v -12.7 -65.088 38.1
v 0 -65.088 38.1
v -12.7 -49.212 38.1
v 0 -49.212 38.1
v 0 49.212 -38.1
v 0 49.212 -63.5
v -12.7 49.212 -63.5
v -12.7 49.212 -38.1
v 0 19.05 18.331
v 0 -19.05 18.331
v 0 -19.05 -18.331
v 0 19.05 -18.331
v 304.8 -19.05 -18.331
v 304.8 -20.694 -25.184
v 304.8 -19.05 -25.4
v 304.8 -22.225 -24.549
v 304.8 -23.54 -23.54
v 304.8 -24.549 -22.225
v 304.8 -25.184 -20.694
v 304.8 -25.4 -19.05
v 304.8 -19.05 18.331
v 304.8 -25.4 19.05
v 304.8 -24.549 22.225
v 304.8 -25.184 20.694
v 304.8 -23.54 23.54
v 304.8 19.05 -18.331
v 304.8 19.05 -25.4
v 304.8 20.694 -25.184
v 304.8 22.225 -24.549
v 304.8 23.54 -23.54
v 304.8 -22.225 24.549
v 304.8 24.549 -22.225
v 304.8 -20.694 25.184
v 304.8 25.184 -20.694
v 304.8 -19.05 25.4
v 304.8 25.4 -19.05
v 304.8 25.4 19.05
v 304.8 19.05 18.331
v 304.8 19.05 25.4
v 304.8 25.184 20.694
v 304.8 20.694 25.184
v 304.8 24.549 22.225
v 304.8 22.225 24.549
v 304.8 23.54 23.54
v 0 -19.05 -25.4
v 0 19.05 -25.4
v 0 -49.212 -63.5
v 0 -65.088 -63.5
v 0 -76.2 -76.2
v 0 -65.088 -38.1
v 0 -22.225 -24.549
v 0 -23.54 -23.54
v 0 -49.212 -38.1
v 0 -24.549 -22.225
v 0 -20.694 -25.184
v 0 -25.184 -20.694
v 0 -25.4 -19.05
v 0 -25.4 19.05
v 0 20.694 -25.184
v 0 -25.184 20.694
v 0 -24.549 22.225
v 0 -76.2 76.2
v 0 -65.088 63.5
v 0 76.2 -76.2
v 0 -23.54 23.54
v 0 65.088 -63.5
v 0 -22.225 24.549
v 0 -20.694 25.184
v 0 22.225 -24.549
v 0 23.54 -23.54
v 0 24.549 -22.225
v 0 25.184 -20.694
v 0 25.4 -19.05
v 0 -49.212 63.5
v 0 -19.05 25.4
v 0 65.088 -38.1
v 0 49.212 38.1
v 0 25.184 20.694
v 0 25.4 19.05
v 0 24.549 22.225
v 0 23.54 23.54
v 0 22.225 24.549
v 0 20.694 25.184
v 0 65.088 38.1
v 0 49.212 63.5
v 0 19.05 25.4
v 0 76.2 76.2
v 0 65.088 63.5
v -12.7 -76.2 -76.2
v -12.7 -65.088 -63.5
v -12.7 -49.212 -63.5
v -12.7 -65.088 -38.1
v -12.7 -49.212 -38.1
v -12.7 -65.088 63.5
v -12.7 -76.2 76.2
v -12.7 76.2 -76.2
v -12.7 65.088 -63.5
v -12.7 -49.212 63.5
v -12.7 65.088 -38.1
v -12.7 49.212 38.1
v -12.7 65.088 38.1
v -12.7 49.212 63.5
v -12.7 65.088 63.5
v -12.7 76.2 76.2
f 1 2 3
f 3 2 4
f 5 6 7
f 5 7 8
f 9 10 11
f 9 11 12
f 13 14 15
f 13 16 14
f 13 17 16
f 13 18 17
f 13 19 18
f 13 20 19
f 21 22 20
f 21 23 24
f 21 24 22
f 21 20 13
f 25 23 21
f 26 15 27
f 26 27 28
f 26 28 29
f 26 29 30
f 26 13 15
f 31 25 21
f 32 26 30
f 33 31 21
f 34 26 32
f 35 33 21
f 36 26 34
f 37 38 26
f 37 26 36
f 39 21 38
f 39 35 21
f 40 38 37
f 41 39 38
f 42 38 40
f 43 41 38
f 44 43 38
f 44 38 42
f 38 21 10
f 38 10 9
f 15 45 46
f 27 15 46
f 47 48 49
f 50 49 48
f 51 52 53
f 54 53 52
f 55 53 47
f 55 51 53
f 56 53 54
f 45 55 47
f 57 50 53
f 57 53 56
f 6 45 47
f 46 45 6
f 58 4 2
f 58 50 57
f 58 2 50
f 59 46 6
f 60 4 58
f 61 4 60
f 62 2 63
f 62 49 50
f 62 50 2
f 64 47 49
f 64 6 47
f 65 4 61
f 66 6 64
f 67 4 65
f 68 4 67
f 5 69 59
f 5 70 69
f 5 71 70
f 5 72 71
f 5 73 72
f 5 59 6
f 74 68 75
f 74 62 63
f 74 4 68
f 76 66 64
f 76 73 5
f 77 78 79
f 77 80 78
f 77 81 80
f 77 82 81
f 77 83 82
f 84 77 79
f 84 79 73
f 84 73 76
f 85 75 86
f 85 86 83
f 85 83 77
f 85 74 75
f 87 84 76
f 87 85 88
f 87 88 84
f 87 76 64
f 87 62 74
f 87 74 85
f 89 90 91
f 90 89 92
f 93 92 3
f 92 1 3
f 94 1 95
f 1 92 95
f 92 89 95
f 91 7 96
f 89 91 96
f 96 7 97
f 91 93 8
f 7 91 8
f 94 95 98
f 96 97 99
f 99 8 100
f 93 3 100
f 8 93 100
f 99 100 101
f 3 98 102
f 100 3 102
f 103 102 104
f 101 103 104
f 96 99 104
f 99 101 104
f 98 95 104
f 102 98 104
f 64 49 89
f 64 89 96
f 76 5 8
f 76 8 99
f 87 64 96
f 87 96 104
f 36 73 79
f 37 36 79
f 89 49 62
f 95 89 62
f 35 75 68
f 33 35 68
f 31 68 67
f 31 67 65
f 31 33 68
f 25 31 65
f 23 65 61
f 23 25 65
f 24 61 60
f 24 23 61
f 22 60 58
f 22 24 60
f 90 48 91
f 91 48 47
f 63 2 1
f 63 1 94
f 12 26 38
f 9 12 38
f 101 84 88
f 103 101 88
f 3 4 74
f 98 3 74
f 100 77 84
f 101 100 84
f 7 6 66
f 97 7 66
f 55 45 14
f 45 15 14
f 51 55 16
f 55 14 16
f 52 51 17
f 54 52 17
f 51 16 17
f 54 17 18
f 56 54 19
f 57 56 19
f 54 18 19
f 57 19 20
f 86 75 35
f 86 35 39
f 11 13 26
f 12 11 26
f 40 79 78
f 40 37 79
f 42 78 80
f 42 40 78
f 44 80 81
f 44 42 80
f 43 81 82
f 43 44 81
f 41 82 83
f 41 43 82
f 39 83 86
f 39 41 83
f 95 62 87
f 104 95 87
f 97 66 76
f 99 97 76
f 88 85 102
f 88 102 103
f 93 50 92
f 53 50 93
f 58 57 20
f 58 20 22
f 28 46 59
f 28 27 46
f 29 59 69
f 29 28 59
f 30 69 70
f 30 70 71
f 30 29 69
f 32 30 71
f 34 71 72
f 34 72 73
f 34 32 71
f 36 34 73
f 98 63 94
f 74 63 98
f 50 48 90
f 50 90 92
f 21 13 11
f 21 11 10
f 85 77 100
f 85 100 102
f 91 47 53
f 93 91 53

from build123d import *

# Parameters (mm, degrees)
F0_W     = 152.4
F0_H     = 152.4
F1_DEPTH = 12.7
F2_W     = 50.8
F2_H     = 50.8
F3_DEPTH = 304.8
F4_W     = 38.1
F4_H     = 36.661644
F5_DEPTH = 304.8
F6_R     = 6.35
F7_W     = 15.875
F7_H     = 25.4
F8_DEPTH = 12.701


with BuildPart() as f1:
    # F0 (on Right) → F1 (new body)
    with BuildSketch(Plane.YZ):
        Rectangle(F0_W, F0_H)
    extrude(amount=-F1_DEPTH)

    # F2 (on face) → F3 (join)
    with BuildSketch(Plane.YZ):
        Rectangle(F2_W, F2_H)
    extrude(amount=F3_DEPTH)

    # F4 (on face) → F5 (cut, through all)
    with BuildSketch(Plane.YZ.offset(304.8)):
        Rectangle(F4_W, F4_H)
    extrude(amount=-F5_DEPTH, mode=Mode.SUBTRACT)

    # F6
    f6_edges = [f1.edges().sort_by_distance(p)[0] for p in [
        (152.4, -25.4, 25.4),
        (152.4, 25.4, 25.4),
        (152.4, -25.4, -25.4),
        (152.4, 25.4, -25.4),
    ]]
    fillet(f6_edges, radius=F6_R)

    # F7 (on face) → F8 (cut, through all)
    with BuildSketch(Plane.YZ):
        with Locations((-57.15, 50.8)):
            Rectangle(F7_W, F7_H)
        with Locations((57.15, 50.8)):
            Rectangle(F7_W, F7_H)
        with Locations((57.15, -50.8)):
            Rectangle(F7_W, F7_H)
        with Locations((-57.15, -50.8)):
            Rectangle(F7_W, F7_H)
    extrude(amount=-F8_DEPTH, mode=Mode.SUBTRACT)


solid = f1.part
